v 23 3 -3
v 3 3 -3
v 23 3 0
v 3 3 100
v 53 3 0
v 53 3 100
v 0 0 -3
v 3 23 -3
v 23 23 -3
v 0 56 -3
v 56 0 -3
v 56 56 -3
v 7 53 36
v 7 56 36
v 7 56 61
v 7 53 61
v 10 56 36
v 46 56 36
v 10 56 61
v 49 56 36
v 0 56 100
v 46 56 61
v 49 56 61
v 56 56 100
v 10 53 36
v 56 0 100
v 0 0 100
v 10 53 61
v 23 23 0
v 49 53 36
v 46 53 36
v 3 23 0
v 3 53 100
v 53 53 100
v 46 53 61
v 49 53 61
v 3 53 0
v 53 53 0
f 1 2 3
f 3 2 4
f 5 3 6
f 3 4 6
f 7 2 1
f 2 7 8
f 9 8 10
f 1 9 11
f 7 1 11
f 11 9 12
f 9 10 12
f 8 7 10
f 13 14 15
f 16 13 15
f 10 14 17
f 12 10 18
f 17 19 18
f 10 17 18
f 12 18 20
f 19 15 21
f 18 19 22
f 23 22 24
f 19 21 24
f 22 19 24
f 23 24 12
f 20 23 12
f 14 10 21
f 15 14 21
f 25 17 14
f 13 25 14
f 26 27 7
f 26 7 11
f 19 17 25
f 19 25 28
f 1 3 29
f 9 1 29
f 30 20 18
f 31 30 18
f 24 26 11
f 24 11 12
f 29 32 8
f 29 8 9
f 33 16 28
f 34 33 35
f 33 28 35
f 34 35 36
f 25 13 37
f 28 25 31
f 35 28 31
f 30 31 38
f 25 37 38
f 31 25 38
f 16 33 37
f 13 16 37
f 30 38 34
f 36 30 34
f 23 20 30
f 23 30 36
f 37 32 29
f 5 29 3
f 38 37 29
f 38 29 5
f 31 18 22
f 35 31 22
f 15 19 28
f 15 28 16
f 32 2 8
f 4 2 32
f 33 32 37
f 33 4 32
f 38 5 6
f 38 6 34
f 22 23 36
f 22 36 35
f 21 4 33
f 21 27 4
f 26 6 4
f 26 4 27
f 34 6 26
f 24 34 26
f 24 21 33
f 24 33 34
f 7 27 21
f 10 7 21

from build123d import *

# Parameters (mm, degrees)
F2_W     = 56
F2_H     = 56
F2_W_2   = 50
F2_H_2   = 50
F3_DEPTH = 100
F4_DEPTH = 3
F5_W     = 20
F5_H     = 20
F6_DEPTH = 3
F7_W     = 3
F7_H     = 25
F8_DEPTH = 3


with BuildPart() as f3:
    # F2 (on Top) → F3 (new body)
    with BuildSketch(Plane.XY):
        with Locations((28, 28)):
            Rectangle(F2_W, F2_H)
        with Locations((28, 28)):
            Rectangle(F2_W_2, F2_H_2, mode=Mode.SUBTRACT)
    extrude(amount=F3_DEPTH)

    # F2 (on Top) → F4 (join)
    with BuildSketch(Plane.XY):
        with Locations((28, 28)):
            Rectangle(F2_W, F2_H)
        with Locations((28, 28)):
            Rectangle(F2_W_2, F2_H_2, mode=Mode.SUBTRACT)
        with Locations((28, 28)):
            Rectangle(F2_W_2, F2_H_2)
    extrude(amount=-F4_DEPTH)

    # F5 (on face) → F6 (cut, through all)
    with BuildSketch(Plane.XY):
        with Locations((13, 13)):
            Rectangle(F5_W, F5_H)
    extrude(amount=-F6_DEPTH, mode=Mode.SUBTRACT)

    # F7 (on face) → F8 (cut, through all)
    with BuildSketch(Plane(origin=(0, 56, 0), x_dir=(-1, 0, 0), z_dir=(0, 1, 0))):
        with Locations((-47.5, 48.5)):
            Rectangle(F7_W, F7_H)
        with Locations((-8.5, 48.5)):
            Rectangle(F7_W, F7_H)
    extrude(amount=-F8_DEPTH, mode=Mode.SUBTRACT)


solid = f3.part
